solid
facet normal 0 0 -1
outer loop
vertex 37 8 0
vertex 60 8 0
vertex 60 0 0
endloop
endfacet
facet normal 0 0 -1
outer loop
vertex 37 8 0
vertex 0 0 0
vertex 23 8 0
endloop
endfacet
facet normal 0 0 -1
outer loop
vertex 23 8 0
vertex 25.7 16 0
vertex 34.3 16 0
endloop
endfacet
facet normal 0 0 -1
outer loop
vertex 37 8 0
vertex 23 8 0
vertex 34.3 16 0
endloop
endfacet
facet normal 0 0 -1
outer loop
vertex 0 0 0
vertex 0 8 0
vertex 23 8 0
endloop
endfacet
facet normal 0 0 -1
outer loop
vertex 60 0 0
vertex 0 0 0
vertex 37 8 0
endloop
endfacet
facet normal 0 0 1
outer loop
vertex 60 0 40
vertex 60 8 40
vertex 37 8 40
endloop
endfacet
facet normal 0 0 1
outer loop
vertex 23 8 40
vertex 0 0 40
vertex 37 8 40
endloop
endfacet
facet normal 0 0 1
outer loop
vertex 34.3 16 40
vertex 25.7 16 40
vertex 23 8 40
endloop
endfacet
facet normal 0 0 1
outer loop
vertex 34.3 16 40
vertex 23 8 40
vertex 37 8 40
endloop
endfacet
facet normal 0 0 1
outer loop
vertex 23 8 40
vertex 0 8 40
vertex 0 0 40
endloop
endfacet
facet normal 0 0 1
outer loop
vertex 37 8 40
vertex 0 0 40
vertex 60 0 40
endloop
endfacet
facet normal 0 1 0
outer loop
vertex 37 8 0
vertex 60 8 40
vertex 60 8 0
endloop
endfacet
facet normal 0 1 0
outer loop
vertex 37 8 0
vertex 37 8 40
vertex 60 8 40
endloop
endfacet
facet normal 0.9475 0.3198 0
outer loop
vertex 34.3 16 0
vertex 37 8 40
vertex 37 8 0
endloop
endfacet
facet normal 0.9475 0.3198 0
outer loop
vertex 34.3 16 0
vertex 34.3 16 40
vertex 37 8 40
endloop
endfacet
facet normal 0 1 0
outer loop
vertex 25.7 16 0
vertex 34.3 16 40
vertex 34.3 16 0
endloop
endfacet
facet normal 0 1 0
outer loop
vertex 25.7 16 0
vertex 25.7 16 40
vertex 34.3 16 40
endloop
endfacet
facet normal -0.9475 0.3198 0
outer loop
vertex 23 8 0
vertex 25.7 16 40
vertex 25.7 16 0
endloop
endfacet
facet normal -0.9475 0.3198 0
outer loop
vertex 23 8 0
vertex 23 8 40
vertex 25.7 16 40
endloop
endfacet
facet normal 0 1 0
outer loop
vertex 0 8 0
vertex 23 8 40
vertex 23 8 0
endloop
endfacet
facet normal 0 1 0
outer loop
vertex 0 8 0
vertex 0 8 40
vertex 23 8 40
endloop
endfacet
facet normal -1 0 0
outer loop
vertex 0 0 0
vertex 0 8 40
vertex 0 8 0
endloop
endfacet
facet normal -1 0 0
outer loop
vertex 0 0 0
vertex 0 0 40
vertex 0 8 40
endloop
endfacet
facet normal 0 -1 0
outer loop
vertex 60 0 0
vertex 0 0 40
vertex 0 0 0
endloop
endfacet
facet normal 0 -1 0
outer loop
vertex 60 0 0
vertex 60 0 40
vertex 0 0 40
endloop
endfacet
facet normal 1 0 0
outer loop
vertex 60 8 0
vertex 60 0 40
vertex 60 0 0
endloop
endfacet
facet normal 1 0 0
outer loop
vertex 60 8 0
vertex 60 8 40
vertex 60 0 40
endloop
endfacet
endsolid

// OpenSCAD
$fn = 32;

// ----------------------------------------------------------------------
// V guide rail: dovetail, 60 mm wide
// ----------------------------------------------------------------------

// --- parameters (mm) ---
rail_w = 60;              // rail width, X
base_t = 8;               // base plate thickness
v_depth = 8;              // V feature depth / height
v_half_w = 7;             // half width of the V at the base face
plate_t = 40;             // rail length, Z (the extrusion height)
top_half_w = 4.3;         // half width at the dovetail top
fit_tol = 0.1;            // declared fit tolerance (prompt contract)
free_tol = 0.3;           // declared free tolerance (prompt contract)

dovetail_base = 2 * v_half_w;  // dovetail width at the base
dovetail_top = 2 * top_half_w;  // dovetail width at the top

profile = [[0, 0], [60, 0], [60, 8], [37, 8], [34.3, 16], [25.7, 16], [23, 8], [0, 8]];  // primary outline, 8 points, counter clockwise

// --- the one profile operation ---
linear_extrude(height = plate_t) polygon(points = profile);
